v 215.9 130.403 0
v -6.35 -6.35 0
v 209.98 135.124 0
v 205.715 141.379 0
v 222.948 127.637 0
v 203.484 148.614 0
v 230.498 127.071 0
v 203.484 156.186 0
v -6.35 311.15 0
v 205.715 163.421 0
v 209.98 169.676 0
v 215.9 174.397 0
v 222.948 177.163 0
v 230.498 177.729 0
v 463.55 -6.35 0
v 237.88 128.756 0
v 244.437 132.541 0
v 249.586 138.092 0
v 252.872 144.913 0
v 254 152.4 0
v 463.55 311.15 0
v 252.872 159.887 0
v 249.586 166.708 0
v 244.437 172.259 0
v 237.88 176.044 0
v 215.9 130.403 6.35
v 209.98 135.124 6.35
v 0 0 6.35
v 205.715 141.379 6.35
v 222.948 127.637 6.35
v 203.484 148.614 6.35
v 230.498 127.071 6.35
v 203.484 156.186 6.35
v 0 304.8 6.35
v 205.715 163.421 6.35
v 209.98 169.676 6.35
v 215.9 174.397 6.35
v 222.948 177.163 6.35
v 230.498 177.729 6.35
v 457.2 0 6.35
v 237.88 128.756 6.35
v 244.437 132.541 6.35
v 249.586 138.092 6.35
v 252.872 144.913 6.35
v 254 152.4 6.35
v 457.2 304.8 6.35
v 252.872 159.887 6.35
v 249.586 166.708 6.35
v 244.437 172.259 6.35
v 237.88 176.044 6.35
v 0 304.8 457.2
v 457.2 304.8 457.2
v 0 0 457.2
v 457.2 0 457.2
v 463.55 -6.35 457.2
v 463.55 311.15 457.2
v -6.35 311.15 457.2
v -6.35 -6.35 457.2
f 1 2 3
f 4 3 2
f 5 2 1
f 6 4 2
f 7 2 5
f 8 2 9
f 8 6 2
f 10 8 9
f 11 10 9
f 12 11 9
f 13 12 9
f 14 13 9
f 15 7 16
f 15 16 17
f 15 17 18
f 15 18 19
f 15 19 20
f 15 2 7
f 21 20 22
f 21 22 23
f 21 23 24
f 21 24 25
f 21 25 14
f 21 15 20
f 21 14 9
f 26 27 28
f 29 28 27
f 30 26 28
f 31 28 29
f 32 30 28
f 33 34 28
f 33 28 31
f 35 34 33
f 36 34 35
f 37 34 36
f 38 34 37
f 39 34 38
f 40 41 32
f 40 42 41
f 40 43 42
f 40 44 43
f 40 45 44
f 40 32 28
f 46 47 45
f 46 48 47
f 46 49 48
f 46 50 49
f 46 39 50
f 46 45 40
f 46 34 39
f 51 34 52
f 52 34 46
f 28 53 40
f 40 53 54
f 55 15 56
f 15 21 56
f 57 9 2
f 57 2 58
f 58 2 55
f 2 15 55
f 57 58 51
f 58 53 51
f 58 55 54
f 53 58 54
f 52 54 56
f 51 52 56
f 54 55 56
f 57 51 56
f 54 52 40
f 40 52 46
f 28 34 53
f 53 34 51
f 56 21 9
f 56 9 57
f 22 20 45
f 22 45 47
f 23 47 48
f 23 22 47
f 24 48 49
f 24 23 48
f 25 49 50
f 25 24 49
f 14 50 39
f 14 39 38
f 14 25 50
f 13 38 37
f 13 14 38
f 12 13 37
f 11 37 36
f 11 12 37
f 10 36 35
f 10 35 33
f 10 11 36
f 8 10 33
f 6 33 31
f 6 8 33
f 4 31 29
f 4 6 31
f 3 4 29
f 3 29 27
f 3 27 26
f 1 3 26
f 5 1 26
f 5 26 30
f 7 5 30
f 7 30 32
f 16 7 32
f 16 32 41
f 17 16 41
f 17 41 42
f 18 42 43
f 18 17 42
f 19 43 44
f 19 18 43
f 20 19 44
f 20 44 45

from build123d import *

# Parameters (mm, degrees)
SKETCH1_W           = 457.2
SKETCH1_H           = 304.8
SKETCH1_R           = 25.4
CHAMBER_BASE_DEPTH  = 6.35
SKETCH2_W           = 457.2
SKETCH2_H           = 304.8
BACK_WALL_DEPTH     = 6.35
SKETCH3_W           = 463.55
SKETCH3_H           = 457.2
SIDE_WALL_2_DEPTH   = 6.35
SKETCH5_W           = 463.55
SKETCH5_H           = 457.2
SIDE_WALL_3_DEPTH   = 6.35
SKETCH6_W           = 457.2
SKETCH6_H           = 317.5
BOSS_EXTRUDE1_DEPTH = 6.35


with BuildPart() as part:
    # Sketch1 → Chamber Base (new body)
    with BuildSketch(Plane.XY):
        with Locations((228.6, 152.4)):
            Rectangle(SKETCH1_W, SKETCH1_H)
        with Locations((228.6, 152.4)):
            Circle(SKETCH1_R, mode=Mode.SUBTRACT)
    extrude(amount=CHAMBER_BASE_DEPTH)

    # Sketch2 → Back wall (add)
    with BuildSketch(Plane(origin=(457.2, 0, 0), x_dir=(0, 0, -1), z_dir=(1, 0, 0))):
        with Locations((-228.6, 152.4)):
            Rectangle(SKETCH2_W, SKETCH2_H)
    extrude(amount=BACK_WALL_DEPTH)

    # Sketch3 → Side wall 2 (add)
    with BuildSketch(Plane(origin=(0, 304.8, 0), x_dir=(1, 0, 0), z_dir=(0, 1, 0))):
        with Locations((231.775, -228.6)):
            Rectangle(SKETCH3_W, SKETCH3_H)
    extrude(amount=SIDE_WALL_2_DEPTH)

    # Sketch5 → Side wall 3 (add)
    with BuildSketch(Plane.XZ):
        with Locations((231.775, 228.6)):
            Rectangle(SKETCH5_W, SKETCH5_H)
    extrude(amount=SIDE_WALL_3_DEPTH)

    # Sketch6 → Boss-Extrude1 (add)
    with BuildSketch(Plane.ZY):
        with Locations((228.6, 152.4)):
            Rectangle(SKETCH6_W, SKETCH6_H)
    extrude(amount=BOSS_EXTRUDE1_DEPTH)


solid = part.part
